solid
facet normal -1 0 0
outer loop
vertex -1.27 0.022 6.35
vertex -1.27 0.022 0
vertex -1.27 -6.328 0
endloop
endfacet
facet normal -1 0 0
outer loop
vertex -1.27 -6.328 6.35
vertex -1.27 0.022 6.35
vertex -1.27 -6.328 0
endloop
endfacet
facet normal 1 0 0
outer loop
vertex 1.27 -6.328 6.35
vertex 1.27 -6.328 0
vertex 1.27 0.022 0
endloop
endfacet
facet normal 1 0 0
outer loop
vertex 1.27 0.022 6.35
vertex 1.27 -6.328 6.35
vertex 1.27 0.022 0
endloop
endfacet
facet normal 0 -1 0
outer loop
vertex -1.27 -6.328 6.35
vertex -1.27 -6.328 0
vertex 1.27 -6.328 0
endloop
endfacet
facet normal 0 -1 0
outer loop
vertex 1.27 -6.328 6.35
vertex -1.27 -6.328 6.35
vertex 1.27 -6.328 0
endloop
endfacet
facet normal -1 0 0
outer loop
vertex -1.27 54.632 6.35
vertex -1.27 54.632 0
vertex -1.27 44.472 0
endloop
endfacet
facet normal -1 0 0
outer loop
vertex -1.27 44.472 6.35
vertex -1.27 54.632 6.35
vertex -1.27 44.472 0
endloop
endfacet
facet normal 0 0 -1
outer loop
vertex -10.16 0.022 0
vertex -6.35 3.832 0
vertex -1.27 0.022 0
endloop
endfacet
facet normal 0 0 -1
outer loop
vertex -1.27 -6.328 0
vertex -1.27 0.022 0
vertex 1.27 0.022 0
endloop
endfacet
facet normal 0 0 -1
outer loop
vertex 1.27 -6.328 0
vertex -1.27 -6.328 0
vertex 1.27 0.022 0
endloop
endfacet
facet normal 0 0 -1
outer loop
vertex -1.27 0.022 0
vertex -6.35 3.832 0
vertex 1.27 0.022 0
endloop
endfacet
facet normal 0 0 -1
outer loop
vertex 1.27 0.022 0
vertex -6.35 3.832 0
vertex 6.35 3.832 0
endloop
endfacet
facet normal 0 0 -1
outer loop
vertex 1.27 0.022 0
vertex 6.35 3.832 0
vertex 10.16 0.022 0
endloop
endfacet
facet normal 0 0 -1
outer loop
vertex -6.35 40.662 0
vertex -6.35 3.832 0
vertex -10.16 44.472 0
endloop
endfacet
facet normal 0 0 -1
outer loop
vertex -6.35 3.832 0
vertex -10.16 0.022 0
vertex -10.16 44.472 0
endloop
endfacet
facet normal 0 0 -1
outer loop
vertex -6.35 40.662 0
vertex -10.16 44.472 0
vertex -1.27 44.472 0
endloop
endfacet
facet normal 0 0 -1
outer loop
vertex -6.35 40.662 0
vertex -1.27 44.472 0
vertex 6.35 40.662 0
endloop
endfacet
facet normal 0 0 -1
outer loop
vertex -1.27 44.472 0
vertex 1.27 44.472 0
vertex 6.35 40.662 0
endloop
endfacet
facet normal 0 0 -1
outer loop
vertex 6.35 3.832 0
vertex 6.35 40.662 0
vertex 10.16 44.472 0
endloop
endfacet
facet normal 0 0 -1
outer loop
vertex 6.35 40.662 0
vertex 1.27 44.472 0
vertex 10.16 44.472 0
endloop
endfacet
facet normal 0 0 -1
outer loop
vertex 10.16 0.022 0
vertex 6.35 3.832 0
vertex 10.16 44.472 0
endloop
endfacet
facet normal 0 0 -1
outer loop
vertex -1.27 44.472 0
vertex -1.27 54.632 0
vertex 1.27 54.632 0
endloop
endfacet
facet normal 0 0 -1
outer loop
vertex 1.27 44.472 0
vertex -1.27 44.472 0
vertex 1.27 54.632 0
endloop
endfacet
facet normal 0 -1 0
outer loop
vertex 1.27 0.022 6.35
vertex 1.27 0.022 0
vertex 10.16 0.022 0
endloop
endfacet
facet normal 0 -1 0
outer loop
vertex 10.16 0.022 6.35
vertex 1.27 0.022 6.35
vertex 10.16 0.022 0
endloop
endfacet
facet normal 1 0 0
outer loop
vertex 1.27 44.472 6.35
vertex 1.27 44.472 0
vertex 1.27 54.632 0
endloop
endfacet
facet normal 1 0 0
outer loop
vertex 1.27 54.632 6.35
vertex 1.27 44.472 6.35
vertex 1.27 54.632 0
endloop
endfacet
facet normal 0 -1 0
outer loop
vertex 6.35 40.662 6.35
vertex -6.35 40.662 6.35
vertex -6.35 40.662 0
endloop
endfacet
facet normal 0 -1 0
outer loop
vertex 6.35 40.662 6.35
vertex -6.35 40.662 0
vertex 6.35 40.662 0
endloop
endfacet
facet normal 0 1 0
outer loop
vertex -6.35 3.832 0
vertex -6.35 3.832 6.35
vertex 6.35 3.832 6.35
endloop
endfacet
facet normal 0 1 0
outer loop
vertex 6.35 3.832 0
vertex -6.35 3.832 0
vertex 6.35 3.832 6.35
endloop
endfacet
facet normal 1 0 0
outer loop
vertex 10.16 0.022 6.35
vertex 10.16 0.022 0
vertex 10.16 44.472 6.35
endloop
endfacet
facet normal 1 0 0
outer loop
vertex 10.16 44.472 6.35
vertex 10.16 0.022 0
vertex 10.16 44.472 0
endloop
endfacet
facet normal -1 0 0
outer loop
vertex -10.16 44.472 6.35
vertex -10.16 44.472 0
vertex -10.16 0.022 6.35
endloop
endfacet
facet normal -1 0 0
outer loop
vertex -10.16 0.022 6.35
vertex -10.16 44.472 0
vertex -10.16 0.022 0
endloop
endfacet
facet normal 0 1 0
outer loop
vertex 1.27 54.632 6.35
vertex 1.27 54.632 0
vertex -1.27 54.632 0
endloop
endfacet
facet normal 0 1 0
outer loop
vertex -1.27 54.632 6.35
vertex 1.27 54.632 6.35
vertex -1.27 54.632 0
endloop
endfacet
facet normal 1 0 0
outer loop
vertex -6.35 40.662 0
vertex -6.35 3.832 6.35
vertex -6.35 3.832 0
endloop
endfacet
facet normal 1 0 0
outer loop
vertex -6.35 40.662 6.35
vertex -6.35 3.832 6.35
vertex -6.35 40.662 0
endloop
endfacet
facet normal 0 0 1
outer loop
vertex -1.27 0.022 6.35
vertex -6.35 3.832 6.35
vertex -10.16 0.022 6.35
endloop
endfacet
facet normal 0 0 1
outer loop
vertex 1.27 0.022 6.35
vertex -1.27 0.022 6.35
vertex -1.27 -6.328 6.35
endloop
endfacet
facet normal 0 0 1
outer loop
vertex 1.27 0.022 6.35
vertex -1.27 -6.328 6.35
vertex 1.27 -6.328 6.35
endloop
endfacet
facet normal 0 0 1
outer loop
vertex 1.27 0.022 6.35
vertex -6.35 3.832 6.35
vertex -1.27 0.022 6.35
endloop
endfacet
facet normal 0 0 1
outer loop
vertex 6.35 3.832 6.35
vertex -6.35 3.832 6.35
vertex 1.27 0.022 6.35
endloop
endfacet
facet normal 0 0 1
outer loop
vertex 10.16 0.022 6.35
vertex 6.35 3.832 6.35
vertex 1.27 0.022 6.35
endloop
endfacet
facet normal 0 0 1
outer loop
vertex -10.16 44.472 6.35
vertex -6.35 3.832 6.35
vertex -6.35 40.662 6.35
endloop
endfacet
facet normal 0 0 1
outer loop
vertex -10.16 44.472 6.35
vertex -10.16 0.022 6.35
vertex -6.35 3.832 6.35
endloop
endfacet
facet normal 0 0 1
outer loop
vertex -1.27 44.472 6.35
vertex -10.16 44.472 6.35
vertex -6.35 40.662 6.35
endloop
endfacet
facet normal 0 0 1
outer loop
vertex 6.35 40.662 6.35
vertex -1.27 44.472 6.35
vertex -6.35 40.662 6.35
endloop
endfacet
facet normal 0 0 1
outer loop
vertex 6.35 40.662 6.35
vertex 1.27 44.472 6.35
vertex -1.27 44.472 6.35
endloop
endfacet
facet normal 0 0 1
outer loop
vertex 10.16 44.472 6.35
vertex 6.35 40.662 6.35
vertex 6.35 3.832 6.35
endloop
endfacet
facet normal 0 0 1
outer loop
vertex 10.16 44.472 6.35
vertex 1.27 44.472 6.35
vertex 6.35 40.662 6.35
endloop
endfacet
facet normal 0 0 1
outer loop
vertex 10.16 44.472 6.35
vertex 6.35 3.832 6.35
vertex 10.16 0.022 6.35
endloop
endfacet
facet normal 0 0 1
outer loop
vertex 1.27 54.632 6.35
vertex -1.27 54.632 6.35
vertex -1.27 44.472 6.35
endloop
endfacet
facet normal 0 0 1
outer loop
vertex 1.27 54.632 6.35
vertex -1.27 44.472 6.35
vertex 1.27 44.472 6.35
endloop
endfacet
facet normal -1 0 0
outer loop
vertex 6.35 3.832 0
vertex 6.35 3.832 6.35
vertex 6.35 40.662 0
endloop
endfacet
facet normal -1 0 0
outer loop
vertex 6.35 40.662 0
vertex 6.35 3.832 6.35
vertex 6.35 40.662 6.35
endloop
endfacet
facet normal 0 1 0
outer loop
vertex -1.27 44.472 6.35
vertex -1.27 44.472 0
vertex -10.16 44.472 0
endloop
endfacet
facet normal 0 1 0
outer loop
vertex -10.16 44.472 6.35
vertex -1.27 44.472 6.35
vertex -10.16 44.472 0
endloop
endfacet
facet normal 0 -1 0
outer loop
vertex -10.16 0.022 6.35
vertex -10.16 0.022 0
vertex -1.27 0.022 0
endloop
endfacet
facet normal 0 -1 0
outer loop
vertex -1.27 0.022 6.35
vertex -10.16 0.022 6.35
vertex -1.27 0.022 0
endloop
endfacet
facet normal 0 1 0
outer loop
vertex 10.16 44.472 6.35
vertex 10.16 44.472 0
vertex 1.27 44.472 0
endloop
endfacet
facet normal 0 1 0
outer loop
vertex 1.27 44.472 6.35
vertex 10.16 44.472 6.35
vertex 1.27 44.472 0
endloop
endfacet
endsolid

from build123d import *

# Parameters (mm, degrees)
BOSS_EXTRUDE1_DEPTH = 6.35
SKETCH3_W           = 12.7
SKETCH3_H           = 36.83
CUT_EXTRUDE1_DEPTH  = 6.35


with BuildPart() as part:
    # Sketch1 → Boss-Extrude1 (new body)
    with BuildSketch(Plane.XY):
        Polygon((10.16, 0.022003094), (10.16, 44.472003094), (1.27, 44.472003094), (1.27, 54.632003094), (-1.27, 54.632003094), (-1.27, 44.472003094), (-10.16, 44.472003094), (-10.16, 0.022003094), (-1.27, 0.022003094), (-1.27, -6.327996906), (1.27, -6.327996906), (1.27, 0.022003094), align=None)
    extrude(amount=BOSS_EXTRUDE1_DEPTH)

    # Sketch3 → Cut-Extrude1 (cut)
    with BuildSketch(Plane.XY.offset(6.35)):
        with Locations((0, 22.247003094)):
            Rectangle(SKETCH3_W, SKETCH3_H)
    extrude(amount=-CUT_EXTRUDE1_DEPTH, mode=Mode.SUBTRACT)


solid = part.part
